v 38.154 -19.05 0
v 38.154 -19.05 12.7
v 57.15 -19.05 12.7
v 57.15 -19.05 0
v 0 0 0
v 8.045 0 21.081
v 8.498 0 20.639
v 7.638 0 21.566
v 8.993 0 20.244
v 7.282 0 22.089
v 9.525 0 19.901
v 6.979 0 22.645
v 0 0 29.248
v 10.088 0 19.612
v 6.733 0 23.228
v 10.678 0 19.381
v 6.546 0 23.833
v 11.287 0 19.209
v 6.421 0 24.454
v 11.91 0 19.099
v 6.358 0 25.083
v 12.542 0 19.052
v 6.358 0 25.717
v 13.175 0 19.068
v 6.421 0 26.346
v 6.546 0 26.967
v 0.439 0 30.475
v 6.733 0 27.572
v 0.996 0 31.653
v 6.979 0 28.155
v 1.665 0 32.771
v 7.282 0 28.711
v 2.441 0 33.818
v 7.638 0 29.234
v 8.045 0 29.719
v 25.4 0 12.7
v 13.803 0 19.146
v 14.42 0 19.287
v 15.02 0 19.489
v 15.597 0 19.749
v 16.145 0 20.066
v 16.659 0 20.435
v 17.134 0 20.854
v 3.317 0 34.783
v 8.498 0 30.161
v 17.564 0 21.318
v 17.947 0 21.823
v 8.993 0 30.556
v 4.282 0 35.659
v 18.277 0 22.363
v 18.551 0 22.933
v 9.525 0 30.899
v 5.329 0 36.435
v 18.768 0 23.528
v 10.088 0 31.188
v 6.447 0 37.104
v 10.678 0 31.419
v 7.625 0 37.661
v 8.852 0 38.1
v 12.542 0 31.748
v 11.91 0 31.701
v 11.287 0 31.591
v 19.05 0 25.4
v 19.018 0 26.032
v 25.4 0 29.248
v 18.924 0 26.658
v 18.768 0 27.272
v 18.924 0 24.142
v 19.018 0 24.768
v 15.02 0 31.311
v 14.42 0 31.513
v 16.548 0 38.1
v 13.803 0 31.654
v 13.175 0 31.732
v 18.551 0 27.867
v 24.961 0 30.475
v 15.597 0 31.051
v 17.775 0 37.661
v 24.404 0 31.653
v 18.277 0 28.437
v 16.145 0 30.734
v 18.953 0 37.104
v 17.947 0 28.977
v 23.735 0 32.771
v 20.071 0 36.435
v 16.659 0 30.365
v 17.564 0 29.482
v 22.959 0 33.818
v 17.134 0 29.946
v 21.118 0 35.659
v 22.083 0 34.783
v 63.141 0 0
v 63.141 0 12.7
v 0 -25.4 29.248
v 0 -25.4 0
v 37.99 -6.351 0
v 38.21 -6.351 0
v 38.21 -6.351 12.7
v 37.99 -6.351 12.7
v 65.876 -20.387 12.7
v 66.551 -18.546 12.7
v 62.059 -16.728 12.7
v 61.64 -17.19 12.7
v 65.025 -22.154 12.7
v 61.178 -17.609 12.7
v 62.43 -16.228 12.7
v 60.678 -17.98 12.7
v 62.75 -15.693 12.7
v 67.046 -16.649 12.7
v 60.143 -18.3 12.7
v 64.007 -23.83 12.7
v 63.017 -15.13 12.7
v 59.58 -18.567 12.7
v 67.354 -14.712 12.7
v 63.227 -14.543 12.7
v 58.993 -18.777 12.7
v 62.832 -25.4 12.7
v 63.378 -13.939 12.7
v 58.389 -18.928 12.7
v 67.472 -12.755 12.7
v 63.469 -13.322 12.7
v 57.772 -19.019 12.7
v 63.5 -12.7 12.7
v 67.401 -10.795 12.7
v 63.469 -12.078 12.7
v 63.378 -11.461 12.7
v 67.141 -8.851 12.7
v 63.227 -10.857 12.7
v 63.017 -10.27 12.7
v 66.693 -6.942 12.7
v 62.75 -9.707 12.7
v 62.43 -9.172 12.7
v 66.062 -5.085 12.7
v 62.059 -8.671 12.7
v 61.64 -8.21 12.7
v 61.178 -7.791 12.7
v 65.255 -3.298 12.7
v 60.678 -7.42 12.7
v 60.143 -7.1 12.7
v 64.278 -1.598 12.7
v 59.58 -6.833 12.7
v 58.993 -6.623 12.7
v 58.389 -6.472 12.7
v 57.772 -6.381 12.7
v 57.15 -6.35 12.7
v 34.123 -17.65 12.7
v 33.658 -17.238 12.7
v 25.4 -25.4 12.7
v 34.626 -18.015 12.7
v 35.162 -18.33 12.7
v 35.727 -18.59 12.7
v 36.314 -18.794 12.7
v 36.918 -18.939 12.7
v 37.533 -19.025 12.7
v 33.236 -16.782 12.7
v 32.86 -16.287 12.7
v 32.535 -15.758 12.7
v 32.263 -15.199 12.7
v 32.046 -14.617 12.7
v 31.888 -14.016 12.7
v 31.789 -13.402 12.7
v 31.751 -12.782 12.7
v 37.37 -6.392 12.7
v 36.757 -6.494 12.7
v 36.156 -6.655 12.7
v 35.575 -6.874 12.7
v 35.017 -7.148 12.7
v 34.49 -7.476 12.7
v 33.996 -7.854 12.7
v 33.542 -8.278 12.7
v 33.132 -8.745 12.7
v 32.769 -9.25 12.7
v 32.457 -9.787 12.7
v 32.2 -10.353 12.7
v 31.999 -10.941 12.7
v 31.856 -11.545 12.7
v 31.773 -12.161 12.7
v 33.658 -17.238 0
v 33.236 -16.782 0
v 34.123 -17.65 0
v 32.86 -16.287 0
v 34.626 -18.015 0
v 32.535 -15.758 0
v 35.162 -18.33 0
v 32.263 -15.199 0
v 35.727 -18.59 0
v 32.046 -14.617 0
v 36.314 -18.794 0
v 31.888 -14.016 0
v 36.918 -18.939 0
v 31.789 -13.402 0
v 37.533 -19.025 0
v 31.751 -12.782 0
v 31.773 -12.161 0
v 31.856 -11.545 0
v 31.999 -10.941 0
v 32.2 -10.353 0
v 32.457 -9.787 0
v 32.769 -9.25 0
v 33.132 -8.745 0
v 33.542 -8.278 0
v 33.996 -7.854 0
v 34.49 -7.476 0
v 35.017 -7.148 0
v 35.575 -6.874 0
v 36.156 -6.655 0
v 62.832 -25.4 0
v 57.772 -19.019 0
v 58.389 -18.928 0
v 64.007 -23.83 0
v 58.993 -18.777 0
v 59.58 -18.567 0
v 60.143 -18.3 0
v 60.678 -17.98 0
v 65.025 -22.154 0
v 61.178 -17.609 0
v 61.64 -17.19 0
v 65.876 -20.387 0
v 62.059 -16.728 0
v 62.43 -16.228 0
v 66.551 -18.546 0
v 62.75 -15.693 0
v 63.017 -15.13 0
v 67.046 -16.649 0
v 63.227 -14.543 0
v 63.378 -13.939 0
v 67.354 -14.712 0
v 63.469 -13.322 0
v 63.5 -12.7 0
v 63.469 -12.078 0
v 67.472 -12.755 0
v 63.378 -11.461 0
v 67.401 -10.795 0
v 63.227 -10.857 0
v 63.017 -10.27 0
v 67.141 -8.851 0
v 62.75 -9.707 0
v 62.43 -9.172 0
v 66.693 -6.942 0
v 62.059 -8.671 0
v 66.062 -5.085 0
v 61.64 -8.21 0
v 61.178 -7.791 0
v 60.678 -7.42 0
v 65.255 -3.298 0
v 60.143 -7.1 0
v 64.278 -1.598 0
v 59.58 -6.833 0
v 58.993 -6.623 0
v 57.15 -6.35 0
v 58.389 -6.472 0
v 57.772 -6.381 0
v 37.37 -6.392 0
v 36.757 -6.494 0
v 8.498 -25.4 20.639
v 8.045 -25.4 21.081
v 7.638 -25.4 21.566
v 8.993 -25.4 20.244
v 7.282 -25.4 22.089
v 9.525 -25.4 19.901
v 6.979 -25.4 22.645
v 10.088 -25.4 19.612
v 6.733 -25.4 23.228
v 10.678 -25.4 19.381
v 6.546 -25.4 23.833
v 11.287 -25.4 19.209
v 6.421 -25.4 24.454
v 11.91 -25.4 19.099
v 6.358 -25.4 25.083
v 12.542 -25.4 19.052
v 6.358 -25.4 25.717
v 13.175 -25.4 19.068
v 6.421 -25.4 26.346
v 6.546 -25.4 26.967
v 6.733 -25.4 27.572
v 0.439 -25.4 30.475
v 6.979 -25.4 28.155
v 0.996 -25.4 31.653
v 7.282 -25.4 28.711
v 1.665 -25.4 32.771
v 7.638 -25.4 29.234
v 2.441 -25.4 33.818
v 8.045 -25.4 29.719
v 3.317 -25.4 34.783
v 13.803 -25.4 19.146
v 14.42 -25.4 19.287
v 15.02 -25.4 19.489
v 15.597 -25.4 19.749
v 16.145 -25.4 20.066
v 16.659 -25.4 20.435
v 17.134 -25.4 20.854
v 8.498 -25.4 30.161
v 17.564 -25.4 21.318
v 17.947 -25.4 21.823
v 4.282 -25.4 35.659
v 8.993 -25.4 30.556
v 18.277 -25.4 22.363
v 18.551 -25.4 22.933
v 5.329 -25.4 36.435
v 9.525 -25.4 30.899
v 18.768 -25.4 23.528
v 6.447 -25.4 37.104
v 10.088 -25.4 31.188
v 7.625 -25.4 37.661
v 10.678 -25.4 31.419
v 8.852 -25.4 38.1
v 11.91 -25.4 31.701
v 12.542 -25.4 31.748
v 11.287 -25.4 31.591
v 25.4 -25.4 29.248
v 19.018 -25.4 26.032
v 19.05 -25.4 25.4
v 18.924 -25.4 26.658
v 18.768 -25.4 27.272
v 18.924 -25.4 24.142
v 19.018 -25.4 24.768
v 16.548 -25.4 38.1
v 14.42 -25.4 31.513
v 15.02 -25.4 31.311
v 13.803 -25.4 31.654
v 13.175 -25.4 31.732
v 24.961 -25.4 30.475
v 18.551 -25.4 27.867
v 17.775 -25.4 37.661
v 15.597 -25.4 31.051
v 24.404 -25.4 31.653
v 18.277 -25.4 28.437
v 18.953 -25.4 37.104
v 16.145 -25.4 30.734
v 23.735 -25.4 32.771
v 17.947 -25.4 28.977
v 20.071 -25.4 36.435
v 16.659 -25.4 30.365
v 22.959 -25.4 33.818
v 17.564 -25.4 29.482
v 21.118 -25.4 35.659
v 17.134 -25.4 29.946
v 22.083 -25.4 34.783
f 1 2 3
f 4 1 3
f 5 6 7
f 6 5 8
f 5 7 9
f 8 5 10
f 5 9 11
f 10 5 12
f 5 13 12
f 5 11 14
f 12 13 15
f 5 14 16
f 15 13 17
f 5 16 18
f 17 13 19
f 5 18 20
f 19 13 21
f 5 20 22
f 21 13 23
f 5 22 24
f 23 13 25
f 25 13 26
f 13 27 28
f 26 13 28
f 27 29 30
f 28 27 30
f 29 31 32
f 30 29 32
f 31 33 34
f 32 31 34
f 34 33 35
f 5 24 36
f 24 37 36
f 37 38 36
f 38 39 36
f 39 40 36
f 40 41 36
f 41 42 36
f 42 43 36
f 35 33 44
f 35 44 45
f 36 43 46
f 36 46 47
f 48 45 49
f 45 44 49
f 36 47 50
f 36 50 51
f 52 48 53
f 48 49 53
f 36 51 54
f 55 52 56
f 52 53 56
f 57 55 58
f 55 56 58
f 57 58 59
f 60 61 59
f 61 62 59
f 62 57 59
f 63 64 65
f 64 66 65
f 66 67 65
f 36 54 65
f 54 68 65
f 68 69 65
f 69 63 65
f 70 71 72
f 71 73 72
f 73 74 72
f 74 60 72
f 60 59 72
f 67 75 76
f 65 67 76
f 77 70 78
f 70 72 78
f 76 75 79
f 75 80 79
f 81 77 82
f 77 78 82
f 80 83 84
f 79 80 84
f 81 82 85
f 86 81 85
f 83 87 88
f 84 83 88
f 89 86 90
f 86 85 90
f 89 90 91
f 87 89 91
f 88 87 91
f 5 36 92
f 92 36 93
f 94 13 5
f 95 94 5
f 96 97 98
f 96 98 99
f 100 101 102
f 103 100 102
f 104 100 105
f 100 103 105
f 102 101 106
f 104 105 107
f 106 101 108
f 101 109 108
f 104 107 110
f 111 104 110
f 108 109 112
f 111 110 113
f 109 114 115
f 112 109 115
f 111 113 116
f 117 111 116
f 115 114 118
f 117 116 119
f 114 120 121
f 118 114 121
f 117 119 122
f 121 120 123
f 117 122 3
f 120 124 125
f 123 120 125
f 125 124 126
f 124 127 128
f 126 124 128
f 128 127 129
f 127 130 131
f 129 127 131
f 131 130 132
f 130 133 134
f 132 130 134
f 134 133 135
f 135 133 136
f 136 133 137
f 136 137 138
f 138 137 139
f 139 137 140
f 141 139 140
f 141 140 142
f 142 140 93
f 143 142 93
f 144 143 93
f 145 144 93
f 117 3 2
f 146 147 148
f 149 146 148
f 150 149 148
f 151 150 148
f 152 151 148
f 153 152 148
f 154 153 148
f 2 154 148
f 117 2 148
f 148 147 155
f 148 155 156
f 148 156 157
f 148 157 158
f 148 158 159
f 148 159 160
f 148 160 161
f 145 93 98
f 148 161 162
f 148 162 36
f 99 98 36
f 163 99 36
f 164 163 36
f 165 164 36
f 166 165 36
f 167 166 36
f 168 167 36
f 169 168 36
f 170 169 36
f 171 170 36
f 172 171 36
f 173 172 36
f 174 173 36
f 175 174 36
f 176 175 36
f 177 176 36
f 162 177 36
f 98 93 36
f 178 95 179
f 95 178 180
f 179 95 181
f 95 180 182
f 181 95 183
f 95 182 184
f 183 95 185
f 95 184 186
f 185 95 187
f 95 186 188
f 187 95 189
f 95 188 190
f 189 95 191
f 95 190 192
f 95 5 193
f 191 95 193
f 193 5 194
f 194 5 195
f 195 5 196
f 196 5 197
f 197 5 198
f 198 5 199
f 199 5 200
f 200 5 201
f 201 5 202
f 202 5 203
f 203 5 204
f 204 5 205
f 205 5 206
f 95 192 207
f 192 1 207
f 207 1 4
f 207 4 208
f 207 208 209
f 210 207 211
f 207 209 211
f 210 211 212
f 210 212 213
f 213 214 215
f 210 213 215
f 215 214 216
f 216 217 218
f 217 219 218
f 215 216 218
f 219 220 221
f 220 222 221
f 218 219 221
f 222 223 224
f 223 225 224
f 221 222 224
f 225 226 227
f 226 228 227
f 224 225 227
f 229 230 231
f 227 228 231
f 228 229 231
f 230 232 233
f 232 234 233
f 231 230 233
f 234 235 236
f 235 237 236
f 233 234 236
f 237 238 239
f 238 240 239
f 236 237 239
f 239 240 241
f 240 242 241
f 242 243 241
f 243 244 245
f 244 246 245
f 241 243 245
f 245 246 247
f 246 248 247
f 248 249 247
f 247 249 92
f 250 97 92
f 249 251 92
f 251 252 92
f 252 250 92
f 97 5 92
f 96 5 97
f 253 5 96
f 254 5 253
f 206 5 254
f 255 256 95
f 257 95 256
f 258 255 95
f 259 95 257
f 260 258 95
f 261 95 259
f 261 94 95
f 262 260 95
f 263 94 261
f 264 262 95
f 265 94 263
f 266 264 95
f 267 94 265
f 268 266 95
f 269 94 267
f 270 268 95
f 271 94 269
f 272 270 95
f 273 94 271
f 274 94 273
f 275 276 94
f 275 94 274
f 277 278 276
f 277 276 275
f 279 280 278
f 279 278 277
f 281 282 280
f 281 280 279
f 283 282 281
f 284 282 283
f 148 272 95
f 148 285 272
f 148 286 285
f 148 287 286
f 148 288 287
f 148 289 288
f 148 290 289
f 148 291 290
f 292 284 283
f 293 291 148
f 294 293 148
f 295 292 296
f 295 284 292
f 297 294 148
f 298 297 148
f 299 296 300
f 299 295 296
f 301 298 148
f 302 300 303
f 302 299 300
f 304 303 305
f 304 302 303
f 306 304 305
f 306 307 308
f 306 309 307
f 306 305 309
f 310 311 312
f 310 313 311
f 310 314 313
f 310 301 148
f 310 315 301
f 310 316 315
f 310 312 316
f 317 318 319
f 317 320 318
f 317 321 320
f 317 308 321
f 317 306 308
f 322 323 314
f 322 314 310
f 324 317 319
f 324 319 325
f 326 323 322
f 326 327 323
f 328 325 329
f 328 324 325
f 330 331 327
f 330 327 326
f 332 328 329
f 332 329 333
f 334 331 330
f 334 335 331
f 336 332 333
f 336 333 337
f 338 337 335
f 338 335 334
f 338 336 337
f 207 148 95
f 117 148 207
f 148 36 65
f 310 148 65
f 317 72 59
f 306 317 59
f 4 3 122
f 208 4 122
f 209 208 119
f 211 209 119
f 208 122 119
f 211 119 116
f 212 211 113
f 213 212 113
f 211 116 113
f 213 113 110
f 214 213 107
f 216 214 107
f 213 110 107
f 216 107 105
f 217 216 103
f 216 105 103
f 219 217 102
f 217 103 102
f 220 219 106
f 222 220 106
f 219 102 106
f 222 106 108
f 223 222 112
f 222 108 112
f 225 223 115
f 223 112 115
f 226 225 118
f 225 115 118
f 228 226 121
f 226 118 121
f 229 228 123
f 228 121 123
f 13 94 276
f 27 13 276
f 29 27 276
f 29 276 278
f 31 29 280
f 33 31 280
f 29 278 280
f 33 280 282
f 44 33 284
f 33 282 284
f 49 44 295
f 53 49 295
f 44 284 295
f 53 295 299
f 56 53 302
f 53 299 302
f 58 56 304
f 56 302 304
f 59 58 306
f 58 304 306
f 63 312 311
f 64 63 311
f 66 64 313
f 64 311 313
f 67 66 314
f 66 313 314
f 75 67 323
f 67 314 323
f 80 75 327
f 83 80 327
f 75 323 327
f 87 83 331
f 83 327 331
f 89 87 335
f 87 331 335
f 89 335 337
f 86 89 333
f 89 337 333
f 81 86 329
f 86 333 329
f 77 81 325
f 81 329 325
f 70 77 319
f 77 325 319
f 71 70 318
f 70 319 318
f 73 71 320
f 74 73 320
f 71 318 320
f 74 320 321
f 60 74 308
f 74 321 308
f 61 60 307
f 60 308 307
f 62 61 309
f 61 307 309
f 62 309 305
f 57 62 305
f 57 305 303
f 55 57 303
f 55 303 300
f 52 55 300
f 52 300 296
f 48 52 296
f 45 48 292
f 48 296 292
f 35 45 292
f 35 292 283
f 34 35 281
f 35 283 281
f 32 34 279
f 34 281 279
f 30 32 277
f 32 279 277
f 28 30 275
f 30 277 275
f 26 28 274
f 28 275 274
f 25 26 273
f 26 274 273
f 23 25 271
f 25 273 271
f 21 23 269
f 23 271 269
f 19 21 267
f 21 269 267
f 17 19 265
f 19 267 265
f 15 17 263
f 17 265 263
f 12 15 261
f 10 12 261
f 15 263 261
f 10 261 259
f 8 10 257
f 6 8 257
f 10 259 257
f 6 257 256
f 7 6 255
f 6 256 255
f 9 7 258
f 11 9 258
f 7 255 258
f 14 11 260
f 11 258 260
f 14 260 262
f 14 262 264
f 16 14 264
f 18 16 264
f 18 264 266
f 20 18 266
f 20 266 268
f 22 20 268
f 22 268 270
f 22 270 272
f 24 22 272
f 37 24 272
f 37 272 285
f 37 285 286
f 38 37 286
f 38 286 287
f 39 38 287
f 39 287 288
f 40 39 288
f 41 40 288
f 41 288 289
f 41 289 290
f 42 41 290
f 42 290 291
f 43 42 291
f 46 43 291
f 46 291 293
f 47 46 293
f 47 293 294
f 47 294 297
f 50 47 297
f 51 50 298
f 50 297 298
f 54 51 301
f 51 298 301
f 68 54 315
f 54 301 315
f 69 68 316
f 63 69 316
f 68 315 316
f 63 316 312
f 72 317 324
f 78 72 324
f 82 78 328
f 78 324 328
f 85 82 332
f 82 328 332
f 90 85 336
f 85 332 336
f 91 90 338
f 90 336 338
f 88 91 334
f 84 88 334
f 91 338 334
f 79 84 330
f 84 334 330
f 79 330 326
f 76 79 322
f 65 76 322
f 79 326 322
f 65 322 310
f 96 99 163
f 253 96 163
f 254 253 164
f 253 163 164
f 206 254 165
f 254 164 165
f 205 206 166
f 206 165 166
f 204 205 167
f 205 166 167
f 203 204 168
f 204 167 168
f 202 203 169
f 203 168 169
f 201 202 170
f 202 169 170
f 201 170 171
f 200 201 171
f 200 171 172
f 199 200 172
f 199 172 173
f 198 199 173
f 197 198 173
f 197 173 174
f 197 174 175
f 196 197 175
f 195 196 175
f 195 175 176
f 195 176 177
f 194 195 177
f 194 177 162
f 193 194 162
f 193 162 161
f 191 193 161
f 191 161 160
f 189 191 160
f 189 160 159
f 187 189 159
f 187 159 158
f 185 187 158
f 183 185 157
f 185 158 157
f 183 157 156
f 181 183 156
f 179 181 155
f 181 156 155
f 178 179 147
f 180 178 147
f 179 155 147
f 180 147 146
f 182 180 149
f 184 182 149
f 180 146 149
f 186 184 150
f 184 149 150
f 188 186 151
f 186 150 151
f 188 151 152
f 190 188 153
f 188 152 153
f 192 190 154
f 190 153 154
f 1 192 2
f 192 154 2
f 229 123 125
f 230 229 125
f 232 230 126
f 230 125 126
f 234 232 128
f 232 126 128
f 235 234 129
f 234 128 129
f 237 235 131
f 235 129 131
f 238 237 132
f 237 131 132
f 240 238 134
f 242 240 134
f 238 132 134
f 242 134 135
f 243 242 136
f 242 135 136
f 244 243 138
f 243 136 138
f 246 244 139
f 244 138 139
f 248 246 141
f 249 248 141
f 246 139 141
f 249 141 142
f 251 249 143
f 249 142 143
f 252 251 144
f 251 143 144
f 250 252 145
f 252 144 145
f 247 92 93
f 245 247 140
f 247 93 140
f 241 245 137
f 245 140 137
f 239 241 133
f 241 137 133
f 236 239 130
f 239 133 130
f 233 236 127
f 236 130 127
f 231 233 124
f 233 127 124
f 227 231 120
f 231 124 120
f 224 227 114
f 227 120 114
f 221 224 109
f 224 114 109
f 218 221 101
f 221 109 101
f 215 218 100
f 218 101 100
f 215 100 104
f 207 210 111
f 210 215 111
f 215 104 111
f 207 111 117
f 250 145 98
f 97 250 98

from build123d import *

# Parameters (mm, degrees)
F1_DEPTH = 25.4
F2_R     = 6.35
F3_DEPTH = 25.4
F5_DEPTH = 25.4
F7_DEPTH = 25.4


with BuildPart() as f1:
    # F0 (on Front) → F1 (new body)
    with BuildSketch(Plane.XZ):
        Polygon((0, 38.1), (0, 0), (69.85, 0), (69.85, 12.7), (25.4, 12.7), (25.4, 38.1), align=None)
    extrude(amount=F1_DEPTH)

    # F2 (on face) → F3 (cut)
    with BuildSketch(Plane.XZ.offset(25.4)):
        with Locations((12.7, 25.4)):
            Circle(F2_R)
    extrude(amount=-F3_DEPTH, mode=Mode.SUBTRACT)

    # F4 (on face) → F5 (cut)
    with BuildSketch(Plane.XZ.offset(25.4)):
        with BuildLine():
            ThreePointArc((0, 29.248118894), (3.3165566282, 34.7834433718), (8.851881106, 38.1))
            Line((8.851881106, 38.1), (0, 38.1))
            Line((0, 38.1), (0, 29.248118894))
        make_face()
        with BuildLine():
            ThreePointArc((16.548118894, 38.1), (22.0834433718, 34.7834433718), (25.4, 29.248118894))
            Line((25.4, 29.248118894), (25.4, 38.1))
            Line((25.4, 38.1), (16.548118894, 38.1))
        make_face()
    extrude(amount=-F5_DEPTH, mode=Mode.SUBTRACT)

    # F6 (on face) → F7 (cut)
    with BuildSketch(Plane.XY.offset(12.7)):
        with BuildLine():
            Line((38.209768584, -6.3509488222), (37.9895952922, -6.350959852))
            ThreePointArc((37.9895952922, -6.350959852), (31.7505322918, -12.7822181363), (38.1540299444, -19.0497701348))
            ThreePointArc((38.1540299444, -19.0497701348), (42.6091900684, -17.1709847826), (44.45, -12.7))
            ThreePointArc((44.45, -12.7), (42.6287708326, -8.2488501771), (38.209768584, -6.3509488222))
        make_face()
        with BuildLine():
            ThreePointArc((44.45, -12.7), (42.6091900684, -17.1709847826), (38.1540299444, -19.0497701348))
            Line((38.1540299444, -19.0497701348), (57.1499231602, -19.0499999995))
            ThreePointArc((57.1499231602, -19.0499999995), (50.8000000011, -12.700120635), (57.1496818903, -6.350000008))
            Line((57.1496818903, -6.350000008), (38.209768584, -6.3509488222))
            ThreePointArc((38.209768584, -6.3509488222), (42.6287708326, -8.2488501771), (44.45, -12.7))
        make_face()
        with BuildLine():
            ThreePointArc((57.1496818903, -6.350000008), (50.8000000011, -12.700120635), (57.1499231602, -19.0499999995))
            ThreePointArc((57.1499231602, -19.0499999995), (61.6401008935, -17.1901552274), (63.5, -12.7))
            ThreePointArc((63.5, -12.7), (61.6400155904, -8.2097594721), (57.1496818903, -6.350000008))
        make_face()
        with BuildLine():
            ThreePointArc((63.1413459778, 0), (67.4724972226, -12.7546630792), (62.8318339586, -25.4))
            Line((62.8318339586, -25.4), (69.85, -25.4))
            Line((69.85, -25.4), (69.85, 0))
            Line((69.85, 0), (63.1413459778, 0))
        make_face()
    extrude(amount=-F7_DEPTH, mode=Mode.SUBTRACT)


solid = f1.part
